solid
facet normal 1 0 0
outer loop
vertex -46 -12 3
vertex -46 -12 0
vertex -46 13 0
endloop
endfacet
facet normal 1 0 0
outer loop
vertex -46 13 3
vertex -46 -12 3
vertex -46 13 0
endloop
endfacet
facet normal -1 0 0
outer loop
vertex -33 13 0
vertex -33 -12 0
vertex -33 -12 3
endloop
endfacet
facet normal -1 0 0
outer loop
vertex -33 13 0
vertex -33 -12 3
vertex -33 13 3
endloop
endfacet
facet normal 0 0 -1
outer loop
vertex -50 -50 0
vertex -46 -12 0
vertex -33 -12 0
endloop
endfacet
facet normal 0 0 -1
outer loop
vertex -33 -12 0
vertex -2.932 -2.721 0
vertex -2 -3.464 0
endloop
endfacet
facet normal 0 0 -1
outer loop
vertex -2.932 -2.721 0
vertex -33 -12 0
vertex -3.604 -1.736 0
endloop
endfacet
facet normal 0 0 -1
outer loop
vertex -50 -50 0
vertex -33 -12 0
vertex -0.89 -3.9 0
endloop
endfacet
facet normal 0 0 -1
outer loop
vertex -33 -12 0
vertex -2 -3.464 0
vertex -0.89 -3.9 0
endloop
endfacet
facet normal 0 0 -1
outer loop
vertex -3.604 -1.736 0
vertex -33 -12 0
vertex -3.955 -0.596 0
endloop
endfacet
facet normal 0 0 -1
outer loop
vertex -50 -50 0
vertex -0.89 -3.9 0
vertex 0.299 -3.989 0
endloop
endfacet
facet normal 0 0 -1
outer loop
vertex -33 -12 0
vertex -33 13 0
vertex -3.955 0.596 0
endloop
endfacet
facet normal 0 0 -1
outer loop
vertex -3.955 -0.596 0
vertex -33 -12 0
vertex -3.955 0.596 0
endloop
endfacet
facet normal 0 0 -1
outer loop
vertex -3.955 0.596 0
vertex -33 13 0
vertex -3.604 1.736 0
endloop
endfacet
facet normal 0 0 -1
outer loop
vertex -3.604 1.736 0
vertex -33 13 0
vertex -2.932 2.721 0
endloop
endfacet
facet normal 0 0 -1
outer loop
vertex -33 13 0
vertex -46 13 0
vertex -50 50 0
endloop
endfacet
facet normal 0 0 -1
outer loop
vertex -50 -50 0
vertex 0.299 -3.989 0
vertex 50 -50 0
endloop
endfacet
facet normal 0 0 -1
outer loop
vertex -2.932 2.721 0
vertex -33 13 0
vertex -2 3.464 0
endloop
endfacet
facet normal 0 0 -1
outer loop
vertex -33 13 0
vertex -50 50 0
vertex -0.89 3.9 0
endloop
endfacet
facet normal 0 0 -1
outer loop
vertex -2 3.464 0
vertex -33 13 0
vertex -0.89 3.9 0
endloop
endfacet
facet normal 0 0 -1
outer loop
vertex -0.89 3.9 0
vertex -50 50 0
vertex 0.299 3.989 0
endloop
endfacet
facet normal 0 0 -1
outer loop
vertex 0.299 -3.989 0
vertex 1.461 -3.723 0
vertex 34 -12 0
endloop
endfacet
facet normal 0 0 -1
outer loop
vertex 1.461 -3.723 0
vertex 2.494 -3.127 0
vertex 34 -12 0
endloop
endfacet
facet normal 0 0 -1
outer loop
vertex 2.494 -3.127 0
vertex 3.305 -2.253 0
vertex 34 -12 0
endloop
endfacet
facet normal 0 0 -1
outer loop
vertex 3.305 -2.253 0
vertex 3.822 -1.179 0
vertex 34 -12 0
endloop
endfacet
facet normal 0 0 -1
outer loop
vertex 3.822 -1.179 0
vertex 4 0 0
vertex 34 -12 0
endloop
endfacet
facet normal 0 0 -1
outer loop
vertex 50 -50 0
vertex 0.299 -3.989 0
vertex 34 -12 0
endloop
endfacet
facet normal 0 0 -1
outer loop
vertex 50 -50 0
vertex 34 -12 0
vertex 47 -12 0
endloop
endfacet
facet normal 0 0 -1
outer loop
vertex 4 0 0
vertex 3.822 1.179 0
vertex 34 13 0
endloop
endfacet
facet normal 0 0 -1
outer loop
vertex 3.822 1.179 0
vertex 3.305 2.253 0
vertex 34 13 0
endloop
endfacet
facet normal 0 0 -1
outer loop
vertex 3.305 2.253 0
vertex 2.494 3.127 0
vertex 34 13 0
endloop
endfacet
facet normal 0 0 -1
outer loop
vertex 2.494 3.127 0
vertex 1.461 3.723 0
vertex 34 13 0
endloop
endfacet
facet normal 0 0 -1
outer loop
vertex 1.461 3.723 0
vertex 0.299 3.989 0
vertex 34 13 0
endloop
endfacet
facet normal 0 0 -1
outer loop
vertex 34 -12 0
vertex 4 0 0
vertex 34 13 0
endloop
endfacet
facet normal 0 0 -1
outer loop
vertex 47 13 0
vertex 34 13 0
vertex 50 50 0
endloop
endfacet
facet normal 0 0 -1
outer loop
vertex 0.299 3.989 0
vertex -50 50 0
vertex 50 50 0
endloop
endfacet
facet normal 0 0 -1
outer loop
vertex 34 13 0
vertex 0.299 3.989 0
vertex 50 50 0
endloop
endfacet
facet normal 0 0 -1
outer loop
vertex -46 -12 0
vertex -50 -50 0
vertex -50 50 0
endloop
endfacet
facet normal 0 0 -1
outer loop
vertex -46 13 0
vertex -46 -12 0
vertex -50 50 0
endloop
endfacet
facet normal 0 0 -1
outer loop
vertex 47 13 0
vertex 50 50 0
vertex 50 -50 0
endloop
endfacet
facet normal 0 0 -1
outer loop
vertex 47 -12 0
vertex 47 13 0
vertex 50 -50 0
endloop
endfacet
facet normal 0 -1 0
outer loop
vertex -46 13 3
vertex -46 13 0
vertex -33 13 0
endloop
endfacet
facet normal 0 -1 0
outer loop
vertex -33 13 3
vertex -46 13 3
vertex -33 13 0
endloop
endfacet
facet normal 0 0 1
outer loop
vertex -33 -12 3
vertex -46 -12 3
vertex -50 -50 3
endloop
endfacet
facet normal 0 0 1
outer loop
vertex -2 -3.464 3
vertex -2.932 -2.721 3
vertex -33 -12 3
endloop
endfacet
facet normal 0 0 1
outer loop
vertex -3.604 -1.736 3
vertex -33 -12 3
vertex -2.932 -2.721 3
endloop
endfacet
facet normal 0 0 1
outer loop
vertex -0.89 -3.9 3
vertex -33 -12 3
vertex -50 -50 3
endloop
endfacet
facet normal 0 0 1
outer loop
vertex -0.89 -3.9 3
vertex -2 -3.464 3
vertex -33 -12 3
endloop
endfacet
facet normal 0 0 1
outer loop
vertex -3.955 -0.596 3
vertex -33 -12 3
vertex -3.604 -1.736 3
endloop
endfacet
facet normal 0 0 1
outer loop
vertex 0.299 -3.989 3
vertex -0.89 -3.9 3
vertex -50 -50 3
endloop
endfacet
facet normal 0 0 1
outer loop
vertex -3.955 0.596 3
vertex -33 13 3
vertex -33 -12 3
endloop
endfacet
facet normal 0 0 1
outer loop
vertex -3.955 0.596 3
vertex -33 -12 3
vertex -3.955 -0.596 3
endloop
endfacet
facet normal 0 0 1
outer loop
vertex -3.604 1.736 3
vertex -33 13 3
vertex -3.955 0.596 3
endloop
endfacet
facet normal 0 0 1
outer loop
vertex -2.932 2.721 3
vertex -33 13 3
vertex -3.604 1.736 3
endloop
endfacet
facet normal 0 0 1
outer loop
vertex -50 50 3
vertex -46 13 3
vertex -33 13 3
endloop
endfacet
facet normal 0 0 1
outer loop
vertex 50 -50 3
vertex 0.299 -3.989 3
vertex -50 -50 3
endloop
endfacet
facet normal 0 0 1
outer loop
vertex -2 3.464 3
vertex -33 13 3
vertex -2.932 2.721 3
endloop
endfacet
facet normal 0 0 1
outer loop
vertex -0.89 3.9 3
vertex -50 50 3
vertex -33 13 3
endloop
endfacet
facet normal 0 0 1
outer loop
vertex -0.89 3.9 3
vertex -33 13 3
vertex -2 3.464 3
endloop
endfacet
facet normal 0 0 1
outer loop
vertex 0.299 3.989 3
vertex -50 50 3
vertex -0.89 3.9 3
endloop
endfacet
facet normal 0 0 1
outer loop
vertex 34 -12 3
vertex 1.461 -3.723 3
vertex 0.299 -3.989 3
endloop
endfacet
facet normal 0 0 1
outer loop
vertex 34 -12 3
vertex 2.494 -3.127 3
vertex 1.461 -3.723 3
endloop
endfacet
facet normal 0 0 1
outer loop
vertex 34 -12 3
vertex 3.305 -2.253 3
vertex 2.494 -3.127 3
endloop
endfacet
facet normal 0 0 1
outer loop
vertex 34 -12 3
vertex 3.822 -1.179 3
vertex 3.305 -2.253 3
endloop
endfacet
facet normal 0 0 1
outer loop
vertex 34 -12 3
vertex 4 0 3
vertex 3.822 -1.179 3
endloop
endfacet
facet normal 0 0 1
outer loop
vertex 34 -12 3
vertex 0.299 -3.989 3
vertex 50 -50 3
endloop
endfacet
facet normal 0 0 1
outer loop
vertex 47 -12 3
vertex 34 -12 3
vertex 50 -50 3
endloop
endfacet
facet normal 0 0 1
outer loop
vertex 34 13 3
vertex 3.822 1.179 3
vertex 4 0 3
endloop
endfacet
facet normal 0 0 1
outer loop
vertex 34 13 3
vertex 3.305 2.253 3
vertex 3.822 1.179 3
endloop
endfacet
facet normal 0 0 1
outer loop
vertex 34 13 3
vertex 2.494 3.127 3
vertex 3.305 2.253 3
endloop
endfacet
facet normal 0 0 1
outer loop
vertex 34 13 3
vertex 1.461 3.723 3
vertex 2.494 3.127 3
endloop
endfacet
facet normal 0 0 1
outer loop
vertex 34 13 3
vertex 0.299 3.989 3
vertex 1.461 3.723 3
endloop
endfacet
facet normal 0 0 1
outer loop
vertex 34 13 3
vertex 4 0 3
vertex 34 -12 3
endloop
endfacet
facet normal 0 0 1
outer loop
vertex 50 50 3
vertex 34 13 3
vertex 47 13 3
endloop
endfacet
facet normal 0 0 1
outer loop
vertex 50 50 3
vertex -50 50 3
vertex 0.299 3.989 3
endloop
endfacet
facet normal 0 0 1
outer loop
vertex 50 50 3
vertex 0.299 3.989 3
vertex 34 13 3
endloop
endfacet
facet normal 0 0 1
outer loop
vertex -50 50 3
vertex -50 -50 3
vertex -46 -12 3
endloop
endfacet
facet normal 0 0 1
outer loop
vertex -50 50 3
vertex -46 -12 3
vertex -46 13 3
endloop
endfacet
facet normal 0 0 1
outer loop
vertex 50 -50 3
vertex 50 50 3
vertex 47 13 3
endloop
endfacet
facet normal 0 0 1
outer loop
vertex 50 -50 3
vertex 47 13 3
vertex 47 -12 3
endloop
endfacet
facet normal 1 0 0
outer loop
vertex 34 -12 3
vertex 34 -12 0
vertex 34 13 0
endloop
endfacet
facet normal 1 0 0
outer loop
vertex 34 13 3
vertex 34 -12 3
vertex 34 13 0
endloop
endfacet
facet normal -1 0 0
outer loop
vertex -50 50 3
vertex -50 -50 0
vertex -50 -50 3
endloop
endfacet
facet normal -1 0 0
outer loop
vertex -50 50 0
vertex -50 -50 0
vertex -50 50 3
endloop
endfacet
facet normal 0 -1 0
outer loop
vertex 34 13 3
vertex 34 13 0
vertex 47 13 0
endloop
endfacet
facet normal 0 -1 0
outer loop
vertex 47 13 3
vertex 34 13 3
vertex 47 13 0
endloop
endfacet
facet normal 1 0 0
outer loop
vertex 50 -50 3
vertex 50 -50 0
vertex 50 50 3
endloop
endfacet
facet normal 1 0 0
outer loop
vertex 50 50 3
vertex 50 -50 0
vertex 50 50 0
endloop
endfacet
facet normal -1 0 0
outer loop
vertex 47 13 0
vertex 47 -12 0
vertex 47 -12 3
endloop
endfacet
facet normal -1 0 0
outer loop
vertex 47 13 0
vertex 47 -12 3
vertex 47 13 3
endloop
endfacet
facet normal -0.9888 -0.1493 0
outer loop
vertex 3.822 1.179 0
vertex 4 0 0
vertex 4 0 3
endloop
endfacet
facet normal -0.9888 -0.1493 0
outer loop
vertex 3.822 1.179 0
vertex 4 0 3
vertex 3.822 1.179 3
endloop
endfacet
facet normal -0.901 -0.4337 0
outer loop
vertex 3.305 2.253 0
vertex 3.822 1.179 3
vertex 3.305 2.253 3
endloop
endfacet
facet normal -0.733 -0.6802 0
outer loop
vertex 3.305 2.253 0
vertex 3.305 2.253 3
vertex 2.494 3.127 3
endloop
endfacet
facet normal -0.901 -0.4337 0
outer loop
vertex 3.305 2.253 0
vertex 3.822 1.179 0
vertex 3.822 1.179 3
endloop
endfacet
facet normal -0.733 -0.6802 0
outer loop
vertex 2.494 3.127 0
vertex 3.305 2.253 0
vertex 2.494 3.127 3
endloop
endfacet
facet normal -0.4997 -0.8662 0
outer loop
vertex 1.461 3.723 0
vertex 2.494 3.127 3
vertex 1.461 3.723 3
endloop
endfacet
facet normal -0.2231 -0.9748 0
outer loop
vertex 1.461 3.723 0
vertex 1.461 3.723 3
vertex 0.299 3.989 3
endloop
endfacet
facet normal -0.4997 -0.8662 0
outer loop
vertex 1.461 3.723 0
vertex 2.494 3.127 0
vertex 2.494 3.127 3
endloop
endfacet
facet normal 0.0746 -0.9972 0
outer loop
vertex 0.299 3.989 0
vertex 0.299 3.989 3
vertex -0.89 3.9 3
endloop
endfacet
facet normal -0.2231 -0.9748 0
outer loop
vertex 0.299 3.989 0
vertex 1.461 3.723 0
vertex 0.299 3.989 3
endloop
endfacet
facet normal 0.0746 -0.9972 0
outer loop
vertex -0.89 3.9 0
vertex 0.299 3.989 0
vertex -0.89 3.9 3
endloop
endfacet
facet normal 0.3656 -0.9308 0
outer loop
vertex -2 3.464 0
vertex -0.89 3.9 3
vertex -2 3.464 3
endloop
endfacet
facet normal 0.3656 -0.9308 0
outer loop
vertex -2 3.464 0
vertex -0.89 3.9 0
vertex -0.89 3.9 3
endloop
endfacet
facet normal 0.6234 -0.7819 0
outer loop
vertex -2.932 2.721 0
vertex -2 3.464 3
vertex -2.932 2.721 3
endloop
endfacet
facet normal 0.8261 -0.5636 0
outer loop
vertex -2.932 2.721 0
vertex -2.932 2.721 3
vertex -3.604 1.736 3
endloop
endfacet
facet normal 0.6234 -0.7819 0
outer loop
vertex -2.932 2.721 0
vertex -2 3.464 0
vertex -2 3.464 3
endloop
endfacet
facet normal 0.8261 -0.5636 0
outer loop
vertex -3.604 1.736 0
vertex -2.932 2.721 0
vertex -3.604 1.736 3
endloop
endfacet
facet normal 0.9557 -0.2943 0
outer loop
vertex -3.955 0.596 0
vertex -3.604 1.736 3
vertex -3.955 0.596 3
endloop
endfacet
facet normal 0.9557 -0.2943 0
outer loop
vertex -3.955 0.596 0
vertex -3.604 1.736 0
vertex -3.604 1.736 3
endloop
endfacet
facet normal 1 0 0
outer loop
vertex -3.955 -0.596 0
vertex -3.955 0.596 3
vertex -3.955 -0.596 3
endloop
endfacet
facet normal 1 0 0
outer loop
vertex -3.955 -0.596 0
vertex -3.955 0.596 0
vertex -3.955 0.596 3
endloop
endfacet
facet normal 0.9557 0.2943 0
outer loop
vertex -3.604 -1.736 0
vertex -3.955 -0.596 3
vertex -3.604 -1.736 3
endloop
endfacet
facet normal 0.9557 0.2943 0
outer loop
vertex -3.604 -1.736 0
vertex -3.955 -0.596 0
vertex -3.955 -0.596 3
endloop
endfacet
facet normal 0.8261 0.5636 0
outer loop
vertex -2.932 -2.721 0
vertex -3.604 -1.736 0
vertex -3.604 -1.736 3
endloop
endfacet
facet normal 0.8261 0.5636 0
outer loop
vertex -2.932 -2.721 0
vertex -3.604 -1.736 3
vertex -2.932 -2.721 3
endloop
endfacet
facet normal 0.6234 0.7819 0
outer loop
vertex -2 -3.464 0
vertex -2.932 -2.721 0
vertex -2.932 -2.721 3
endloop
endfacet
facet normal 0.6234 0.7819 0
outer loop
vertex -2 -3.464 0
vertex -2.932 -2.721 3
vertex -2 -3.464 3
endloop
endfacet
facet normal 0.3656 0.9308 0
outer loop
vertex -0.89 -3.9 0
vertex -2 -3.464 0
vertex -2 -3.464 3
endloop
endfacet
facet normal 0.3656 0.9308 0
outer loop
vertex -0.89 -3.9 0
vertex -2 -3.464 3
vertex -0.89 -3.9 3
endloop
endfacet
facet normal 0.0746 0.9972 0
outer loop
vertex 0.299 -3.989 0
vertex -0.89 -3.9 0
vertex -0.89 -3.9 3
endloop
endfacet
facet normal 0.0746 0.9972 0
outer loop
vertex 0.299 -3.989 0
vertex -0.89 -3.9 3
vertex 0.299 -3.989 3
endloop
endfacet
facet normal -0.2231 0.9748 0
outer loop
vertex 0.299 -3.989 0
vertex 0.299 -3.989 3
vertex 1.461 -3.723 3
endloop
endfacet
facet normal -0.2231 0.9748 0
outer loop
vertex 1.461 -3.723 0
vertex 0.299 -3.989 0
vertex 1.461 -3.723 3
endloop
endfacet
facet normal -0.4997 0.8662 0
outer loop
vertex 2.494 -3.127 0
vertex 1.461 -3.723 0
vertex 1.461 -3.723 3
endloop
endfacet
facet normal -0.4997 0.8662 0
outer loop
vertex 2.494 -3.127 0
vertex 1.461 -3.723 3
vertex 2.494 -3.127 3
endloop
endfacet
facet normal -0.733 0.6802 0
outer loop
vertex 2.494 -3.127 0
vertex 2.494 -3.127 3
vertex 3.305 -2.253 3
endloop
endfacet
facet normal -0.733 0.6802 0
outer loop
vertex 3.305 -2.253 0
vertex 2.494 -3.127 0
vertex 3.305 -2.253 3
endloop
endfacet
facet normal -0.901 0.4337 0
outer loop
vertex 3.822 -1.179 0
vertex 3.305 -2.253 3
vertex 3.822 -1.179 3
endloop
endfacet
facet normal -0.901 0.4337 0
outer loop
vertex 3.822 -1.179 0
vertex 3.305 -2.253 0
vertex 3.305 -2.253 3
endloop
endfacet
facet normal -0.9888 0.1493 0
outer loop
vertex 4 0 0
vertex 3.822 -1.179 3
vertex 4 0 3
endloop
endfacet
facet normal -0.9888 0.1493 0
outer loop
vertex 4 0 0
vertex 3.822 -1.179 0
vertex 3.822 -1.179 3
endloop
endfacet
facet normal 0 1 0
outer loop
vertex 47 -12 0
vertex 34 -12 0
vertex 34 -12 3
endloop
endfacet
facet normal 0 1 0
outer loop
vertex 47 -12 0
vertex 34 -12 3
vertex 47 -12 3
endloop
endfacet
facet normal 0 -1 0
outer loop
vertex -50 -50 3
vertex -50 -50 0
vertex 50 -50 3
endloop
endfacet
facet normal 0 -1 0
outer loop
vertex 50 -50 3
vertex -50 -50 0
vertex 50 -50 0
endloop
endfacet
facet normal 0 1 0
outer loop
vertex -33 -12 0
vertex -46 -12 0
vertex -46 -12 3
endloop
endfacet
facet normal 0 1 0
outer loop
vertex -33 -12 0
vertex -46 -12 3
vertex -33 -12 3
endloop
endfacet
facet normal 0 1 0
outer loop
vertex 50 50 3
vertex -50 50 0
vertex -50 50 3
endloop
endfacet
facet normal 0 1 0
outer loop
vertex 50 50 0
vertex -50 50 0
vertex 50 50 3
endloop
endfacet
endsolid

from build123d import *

# Parameters (mm, degrees)
BOX002_W       = 13
BOX002_H       = 25
BOX002_DEPTH   = 3
BOX001_W       = 13
BOX001_H       = 25
BOX001_DEPTH   = 3
CYLINDER_R     = 4
CYLINDER_DEPTH = 3
BOX_W          = 100
BOX_H          = 100
BOX_DEPTH      = 3


with BuildPart() as cube002:
    # Box002 → Box002 (new body)
    with BuildSketch(Plane(origin=(-46, -12, 0), x_dir=(1, 0, 0), z_dir=(0, 0, 1))):
        with Locations((6.5, 12.5)):
            Rectangle(BOX002_W, BOX002_H)
    extrude(amount=BOX002_DEPTH)


with BuildPart() as cube001:
    # Box001 → Box001 (new body)
    with BuildSketch(Plane(origin=(34, -12, 0), x_dir=(1, 0, 0), z_dir=(0, 0, 1))):
        with Locations((6.5, 12.5)):
            Rectangle(BOX001_W, BOX001_H)
    extrude(amount=BOX001_DEPTH)


with BuildPart() as cylinder:
    # Cylinder → Cylinder (new body)
    with BuildSketch(Plane.XY):
        Circle(CYLINDER_R)
    extrude(amount=CYLINDER_DEPTH)


with BuildPart() as cut002:
    # Box → Box (new body)
    with BuildSketch(Plane(origin=(-50, -50, 0), x_dir=(1, 0, 0), z_dir=(0, 0, 1))):
        with Locations((50, 50)):
            Rectangle(BOX_W, BOX_H)
    extrude(amount=BOX_DEPTH)

    # Cut: cut Cylinder
    add(cylinder.part, mode=Mode.SUBTRACT)

    # Cut001: cut Cube001
    add(cube001.part, mode=Mode.SUBTRACT)

    # Cut002: cut Cube002
    add(cube002.part, mode=Mode.SUBTRACT)


solid = cut002.part
